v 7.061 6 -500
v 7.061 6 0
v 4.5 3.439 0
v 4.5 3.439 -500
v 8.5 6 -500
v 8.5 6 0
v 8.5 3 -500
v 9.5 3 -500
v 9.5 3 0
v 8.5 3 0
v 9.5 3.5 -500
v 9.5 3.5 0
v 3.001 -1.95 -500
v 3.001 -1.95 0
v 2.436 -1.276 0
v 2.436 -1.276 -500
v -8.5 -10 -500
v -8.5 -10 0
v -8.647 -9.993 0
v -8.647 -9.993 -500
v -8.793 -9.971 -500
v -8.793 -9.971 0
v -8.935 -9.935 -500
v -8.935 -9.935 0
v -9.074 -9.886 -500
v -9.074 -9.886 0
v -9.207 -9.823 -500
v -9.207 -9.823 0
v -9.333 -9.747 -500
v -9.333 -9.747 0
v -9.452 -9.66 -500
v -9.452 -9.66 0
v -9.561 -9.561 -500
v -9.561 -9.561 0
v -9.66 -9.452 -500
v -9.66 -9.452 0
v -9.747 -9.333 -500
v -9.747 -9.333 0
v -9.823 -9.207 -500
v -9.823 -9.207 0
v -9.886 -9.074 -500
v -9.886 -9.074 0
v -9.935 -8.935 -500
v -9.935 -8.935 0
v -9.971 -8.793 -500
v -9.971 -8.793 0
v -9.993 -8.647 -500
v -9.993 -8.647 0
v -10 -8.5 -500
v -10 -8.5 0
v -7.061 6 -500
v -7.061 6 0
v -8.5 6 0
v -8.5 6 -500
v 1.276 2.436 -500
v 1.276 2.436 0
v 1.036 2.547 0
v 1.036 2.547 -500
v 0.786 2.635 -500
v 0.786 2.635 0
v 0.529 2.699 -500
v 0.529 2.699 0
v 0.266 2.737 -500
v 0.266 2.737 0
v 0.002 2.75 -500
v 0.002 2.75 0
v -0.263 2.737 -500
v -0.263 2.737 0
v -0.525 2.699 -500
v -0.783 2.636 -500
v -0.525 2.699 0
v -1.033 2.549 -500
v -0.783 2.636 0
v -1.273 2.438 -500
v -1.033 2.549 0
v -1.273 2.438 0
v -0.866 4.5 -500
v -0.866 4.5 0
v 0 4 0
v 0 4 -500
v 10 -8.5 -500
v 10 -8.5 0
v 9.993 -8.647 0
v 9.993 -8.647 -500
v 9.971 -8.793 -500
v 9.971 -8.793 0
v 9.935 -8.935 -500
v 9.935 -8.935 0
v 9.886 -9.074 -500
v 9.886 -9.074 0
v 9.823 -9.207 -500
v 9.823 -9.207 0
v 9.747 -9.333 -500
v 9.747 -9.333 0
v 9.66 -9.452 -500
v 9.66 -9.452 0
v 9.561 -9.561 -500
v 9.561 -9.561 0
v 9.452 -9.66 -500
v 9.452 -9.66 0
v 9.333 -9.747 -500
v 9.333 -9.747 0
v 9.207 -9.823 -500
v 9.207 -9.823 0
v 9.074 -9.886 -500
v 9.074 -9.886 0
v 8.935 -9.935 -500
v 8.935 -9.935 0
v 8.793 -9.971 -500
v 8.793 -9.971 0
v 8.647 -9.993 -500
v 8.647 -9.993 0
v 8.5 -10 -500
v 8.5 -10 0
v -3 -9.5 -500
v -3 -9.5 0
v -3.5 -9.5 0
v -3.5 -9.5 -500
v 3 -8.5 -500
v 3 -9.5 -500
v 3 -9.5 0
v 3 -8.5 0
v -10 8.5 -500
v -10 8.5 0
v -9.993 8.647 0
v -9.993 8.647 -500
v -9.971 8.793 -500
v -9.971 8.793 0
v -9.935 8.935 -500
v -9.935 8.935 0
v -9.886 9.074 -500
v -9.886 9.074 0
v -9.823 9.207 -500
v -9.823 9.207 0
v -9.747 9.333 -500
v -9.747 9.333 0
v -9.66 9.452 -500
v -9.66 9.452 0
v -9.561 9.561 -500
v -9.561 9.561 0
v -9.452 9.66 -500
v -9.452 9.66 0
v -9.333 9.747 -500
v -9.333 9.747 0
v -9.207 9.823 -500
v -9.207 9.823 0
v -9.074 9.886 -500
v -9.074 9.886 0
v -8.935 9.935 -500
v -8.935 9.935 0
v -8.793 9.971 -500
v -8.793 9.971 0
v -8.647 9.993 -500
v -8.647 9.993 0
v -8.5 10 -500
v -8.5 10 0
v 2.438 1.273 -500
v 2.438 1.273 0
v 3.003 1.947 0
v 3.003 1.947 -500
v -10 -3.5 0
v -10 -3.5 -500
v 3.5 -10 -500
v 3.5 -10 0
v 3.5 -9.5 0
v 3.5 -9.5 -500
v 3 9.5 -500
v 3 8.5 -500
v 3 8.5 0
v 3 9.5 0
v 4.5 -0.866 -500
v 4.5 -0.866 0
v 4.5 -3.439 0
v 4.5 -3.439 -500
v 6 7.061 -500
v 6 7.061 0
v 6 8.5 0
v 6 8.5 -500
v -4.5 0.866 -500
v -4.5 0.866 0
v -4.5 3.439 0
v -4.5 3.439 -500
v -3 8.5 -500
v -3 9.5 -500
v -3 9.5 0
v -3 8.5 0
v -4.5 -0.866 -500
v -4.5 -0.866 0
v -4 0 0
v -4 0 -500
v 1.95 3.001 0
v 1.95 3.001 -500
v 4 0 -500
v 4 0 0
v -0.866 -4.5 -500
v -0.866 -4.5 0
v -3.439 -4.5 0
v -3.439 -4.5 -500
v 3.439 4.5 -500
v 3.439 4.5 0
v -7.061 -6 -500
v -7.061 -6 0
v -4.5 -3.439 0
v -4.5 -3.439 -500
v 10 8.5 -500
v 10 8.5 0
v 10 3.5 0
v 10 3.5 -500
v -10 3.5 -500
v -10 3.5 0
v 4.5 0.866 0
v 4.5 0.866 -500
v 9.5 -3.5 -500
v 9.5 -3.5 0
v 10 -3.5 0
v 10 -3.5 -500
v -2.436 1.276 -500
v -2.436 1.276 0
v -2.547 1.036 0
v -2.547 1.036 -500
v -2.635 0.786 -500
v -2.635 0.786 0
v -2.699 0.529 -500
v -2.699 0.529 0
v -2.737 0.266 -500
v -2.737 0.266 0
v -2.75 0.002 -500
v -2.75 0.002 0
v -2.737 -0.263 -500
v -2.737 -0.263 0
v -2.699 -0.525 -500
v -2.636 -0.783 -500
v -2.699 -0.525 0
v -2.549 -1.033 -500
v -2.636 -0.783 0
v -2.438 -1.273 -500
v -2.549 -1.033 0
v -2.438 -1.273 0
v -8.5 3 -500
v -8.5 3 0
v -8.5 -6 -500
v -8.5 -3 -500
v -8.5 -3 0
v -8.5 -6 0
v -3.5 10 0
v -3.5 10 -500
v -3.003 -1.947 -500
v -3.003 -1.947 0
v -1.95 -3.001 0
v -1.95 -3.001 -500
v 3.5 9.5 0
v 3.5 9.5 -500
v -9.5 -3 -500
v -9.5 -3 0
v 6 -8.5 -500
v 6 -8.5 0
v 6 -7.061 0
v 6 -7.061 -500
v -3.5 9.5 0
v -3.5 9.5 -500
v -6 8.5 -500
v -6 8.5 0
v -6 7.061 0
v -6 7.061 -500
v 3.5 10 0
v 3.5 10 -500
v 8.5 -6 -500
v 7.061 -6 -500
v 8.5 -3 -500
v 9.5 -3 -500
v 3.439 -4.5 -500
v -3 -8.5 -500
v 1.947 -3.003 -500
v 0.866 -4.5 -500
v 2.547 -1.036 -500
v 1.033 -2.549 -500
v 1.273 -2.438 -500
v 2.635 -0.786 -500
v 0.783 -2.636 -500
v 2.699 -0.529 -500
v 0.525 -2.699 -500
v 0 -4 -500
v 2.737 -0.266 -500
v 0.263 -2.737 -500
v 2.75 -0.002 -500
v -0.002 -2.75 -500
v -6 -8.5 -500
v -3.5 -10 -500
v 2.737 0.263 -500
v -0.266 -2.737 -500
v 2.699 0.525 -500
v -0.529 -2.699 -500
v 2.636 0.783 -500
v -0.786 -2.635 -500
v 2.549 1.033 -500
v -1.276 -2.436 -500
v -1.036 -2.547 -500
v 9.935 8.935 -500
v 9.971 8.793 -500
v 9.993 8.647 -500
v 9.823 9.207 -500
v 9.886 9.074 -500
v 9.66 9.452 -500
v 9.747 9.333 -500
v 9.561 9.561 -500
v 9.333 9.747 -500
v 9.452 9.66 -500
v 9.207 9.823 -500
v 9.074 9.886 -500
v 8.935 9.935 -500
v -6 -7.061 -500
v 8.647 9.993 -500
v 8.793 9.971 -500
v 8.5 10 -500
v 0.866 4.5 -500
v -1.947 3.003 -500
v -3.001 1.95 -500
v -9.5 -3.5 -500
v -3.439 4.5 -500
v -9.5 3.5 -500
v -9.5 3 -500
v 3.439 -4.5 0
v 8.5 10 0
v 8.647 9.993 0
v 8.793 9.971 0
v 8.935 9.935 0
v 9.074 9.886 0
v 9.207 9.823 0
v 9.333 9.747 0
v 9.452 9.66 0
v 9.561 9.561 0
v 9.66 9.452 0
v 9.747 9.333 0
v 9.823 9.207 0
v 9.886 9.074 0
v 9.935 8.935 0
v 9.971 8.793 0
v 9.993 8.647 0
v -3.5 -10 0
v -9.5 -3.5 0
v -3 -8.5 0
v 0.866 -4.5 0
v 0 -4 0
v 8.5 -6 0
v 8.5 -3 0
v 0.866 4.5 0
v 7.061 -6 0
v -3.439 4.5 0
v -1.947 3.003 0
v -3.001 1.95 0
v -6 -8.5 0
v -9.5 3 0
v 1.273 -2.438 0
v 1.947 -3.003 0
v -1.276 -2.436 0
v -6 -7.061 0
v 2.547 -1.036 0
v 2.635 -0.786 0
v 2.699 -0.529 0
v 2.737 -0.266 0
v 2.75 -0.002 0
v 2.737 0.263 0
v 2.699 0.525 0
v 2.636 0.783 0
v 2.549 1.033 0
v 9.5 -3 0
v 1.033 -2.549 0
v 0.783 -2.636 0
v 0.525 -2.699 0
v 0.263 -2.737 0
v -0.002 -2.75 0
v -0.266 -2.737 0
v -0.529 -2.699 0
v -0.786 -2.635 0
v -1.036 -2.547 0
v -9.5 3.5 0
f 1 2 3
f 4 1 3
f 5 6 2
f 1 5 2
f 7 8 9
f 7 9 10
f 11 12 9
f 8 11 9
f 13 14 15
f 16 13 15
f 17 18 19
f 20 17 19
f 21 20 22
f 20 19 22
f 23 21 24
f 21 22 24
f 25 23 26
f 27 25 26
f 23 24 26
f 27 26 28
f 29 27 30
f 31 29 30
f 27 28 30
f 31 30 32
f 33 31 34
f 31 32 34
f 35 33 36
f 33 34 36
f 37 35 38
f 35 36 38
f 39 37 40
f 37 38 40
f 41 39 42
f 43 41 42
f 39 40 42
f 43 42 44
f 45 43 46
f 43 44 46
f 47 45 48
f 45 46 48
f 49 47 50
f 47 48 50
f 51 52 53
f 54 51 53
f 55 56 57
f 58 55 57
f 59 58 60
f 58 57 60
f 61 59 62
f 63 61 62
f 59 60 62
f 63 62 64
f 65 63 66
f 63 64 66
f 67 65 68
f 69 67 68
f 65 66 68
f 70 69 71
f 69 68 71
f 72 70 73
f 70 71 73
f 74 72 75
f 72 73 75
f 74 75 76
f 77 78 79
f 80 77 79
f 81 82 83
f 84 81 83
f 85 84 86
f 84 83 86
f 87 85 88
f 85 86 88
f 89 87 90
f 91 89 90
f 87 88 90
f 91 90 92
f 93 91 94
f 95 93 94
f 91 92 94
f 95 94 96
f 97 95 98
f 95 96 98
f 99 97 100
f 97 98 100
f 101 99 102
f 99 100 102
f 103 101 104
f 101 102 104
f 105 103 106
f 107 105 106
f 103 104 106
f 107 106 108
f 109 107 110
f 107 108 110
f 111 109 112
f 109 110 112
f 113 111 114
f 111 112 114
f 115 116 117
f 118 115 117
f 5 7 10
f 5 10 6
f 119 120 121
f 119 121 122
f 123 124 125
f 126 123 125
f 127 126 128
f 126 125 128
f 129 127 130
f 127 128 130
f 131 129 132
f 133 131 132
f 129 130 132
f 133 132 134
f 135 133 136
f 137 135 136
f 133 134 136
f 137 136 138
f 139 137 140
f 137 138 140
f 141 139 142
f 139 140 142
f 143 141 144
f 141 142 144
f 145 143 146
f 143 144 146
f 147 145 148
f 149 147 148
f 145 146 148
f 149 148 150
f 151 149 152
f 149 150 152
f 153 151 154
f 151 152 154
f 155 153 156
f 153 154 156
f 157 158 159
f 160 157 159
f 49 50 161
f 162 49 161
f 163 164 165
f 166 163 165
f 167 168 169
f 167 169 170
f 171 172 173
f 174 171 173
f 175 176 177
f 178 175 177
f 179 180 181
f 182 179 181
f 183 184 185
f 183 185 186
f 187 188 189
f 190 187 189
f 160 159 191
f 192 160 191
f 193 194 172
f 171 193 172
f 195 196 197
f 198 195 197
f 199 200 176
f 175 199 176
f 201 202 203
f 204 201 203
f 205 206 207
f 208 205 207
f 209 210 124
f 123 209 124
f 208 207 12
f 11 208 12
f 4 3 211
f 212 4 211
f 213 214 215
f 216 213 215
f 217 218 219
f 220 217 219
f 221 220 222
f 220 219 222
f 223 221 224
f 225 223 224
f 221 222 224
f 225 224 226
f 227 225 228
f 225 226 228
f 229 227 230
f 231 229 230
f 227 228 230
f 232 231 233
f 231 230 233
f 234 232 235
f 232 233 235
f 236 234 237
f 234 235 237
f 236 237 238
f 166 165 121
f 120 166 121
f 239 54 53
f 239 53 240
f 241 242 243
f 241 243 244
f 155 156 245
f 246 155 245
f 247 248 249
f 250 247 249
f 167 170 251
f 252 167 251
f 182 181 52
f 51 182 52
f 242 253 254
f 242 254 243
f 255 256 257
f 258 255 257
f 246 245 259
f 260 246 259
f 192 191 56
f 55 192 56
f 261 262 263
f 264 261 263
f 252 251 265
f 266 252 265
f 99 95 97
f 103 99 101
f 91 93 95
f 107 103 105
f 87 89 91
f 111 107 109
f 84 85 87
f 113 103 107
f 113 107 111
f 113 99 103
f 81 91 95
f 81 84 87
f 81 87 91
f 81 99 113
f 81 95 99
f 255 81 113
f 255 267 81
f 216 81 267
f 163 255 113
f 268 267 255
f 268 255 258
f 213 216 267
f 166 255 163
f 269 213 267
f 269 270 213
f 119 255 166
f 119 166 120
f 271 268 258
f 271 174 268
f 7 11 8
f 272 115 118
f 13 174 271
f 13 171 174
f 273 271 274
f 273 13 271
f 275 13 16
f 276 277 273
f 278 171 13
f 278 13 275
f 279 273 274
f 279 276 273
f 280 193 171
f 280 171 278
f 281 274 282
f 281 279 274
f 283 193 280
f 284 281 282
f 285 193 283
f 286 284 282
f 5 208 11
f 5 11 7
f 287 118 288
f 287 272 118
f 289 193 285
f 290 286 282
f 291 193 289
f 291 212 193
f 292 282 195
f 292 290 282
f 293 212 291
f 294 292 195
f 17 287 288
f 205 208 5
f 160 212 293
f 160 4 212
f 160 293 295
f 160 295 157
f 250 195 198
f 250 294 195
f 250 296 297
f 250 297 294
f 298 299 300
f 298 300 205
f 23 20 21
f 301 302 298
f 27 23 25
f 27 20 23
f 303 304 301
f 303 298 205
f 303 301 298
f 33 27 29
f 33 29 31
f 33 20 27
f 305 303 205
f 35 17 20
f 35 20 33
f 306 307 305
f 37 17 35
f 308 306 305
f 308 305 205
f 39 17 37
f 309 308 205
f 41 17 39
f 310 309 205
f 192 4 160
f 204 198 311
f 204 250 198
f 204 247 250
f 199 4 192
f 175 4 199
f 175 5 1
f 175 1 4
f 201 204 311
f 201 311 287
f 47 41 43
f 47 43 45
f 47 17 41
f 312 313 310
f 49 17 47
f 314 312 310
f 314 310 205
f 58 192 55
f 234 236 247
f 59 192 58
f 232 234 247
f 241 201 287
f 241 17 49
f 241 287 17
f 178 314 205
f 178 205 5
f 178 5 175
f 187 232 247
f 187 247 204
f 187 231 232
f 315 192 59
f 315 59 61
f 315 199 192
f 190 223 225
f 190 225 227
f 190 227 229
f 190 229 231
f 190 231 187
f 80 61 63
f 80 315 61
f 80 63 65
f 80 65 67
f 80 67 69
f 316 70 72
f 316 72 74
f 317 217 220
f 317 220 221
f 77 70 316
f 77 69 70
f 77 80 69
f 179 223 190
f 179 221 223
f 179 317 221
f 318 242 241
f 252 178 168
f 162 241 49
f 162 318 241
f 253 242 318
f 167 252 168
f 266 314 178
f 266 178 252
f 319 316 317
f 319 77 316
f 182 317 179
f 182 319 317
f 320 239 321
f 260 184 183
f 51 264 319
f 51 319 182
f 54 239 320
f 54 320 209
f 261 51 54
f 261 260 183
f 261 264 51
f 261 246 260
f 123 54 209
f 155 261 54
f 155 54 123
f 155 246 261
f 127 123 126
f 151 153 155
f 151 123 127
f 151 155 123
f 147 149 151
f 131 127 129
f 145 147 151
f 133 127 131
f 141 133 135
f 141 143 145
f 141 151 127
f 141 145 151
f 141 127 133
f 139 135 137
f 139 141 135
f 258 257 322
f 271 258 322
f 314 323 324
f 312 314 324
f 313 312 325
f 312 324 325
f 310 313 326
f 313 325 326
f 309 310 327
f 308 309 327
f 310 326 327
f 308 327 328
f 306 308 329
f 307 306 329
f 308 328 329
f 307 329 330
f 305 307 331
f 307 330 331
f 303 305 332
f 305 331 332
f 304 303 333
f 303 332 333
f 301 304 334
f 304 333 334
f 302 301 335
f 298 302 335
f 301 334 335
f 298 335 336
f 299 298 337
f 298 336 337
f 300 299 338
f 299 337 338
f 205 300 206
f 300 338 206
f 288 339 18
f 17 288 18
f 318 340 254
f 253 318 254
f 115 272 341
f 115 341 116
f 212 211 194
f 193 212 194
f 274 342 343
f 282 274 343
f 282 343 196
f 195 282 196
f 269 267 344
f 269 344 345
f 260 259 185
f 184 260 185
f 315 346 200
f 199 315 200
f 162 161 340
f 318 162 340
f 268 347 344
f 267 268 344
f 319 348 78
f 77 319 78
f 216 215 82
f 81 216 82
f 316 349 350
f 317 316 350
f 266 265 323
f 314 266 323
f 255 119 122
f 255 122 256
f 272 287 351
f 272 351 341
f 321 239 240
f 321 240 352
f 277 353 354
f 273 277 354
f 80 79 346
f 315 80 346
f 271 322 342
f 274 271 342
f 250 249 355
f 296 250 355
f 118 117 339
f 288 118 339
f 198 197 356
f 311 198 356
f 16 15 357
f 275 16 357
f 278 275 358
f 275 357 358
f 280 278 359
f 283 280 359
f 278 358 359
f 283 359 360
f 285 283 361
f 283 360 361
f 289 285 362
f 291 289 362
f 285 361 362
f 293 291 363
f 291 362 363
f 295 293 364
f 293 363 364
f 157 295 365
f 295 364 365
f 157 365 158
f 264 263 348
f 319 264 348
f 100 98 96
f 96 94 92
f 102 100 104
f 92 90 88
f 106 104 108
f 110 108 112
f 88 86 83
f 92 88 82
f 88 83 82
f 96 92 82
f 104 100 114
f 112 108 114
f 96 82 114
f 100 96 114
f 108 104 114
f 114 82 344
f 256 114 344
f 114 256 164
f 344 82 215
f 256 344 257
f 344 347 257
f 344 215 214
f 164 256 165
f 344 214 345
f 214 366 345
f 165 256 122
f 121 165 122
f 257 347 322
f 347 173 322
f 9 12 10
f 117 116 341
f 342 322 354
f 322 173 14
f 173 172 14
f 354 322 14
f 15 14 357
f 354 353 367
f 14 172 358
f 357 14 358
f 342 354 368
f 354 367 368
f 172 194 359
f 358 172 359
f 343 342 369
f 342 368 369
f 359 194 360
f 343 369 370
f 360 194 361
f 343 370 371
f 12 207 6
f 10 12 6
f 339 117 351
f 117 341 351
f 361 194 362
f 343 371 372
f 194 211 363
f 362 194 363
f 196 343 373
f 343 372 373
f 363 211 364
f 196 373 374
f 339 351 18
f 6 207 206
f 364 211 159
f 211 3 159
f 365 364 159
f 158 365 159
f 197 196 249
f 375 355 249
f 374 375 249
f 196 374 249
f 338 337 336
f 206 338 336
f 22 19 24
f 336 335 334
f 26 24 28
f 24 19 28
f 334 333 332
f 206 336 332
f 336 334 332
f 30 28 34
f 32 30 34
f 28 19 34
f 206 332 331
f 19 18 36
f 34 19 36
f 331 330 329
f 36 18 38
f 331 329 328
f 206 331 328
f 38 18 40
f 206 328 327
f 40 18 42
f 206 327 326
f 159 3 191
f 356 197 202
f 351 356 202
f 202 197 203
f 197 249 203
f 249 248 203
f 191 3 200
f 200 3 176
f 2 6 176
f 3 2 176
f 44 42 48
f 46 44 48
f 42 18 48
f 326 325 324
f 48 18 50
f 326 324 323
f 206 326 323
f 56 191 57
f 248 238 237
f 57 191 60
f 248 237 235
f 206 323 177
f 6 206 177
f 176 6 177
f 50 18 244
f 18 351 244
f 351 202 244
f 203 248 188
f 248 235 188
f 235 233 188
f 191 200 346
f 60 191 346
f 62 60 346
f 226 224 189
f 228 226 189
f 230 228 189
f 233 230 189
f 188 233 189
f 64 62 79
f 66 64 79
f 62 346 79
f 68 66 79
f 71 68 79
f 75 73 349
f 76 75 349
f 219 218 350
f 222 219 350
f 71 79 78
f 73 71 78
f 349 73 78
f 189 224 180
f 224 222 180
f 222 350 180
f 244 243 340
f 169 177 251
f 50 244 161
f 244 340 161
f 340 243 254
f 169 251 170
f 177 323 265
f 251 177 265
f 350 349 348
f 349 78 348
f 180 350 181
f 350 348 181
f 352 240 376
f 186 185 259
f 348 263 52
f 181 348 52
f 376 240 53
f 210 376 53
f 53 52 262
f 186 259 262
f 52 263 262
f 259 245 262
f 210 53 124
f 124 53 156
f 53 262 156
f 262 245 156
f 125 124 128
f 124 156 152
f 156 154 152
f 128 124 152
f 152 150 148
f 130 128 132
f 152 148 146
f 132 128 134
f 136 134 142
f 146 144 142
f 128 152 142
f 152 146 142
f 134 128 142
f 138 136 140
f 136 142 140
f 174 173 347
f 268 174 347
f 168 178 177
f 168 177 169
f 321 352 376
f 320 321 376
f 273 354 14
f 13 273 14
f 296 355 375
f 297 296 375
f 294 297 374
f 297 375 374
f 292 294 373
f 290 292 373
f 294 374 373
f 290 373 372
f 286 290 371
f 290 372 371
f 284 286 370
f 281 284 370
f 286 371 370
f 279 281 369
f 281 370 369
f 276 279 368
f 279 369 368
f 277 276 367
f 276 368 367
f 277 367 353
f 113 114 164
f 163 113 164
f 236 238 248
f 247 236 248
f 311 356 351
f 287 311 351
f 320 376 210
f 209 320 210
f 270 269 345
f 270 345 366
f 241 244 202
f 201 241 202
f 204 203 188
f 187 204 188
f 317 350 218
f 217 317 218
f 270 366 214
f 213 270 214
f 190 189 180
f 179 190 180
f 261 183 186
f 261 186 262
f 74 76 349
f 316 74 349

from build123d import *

# Parameters (mm, degrees)
BOSS_EXTRU_1_DEPTH      = 500
ENL_V_MAT_EXTRU_1_DEPTH = 501.199960016


with BuildPart() as part:
    # Esquisse1 → Boss.-Extru.1 (new body)
    with BuildSketch(Plane.XY):
        with BuildLine():
            Line((-4, 0), (-4.5, 0.866025404))
            Line((-4.5, 0.866025404), (-4.5, 3.439339828))
            Line((-4.5, 3.439339828), (-7.060660172, 6))
            Line((-7.060660172, 6), (-8.5, 6))
            Line((-8.5, 6), (-8.5, 3))
            Line((-8.5, 3), (-9.5, 3))
            Line((-9.5, 3), (-9.5, 3.5))
            Line((-9.5, 3.5), (-10, 3.5))
            Line((-10, 3.5), (-10, 8.5))
            ThreePointArc((-10, 8.5), (-9.560660172, 9.560660172), (-8.5, 10))
            Line((-8.5, 10), (-3.5, 10))
            Line((-3.5, 10), (-3.5, 9.5))
            Line((-3.5, 9.5), (-3, 9.5))
            Line((-3, 9.5), (-3, 8.5))
            Line((-3, 8.5), (-6, 8.5))
            Line((-6, 8.5), (-6, 7.060660172))
            Line((-6, 7.060660172), (-3.439339828, 4.5))
            Line((-3.439339828, 4.5), (-0.866025404, 4.5))
            Line((-0.866025404, 4.5), (0, 4))
            Line((0, 4), (0.866025404, 4.5))
            Line((0.866025404, 4.5), (3.439339828, 4.5))
            Line((3.439339828, 4.5), (6, 7.060660172))
            Line((6, 7.060660172), (6, 8.5))
            Line((6, 8.5), (3, 8.5))
            Line((3, 8.5), (3, 9.5))
            Line((3, 9.5), (3.5, 9.5))
            Line((3.5, 9.5), (3.5, 10))
            Line((3.5, 10), (8.5, 10))
            ThreePointArc((8.5, 10), (9.560660172, 9.560660172), (10, 8.5))
            Line((10, 8.5), (10, 3.5))
            Line((10, 3.5), (9.5, 3.5))
            Line((9.5, 3.5), (9.5, 3))
            Line((9.5, 3), (8.5, 3))
            Line((8.5, 3), (8.5, 6))
            Line((8.5, 6), (7.060660172, 6))
            Line((7.060660172, 6), (4.5, 3.439339828))
            Line((4.5, 3.439339828), (4.5, 0.866025404))
            Line((4.5, 0.866025404), (4, 0))
            Line((4, 0), (4.5, -0.866025404))
            Line((4.5, -0.866025404), (4.5, -3.439339828))
            Line((4.5, -3.439339828), (7.060660172, -6))
            Line((7.060660172, -6), (8.5, -6))
            Line((8.5, -6), (8.5, -3))
            Line((8.5, -3), (9.5, -3))
            Line((9.5, -3), (9.5, -3.5))
            Line((9.5, -3.5), (10, -3.5))
            Line((10, -3.5), (10, -8.5))
            ThreePointArc((10, -8.5), (9.560660172, -9.560660172), (8.5, -10))
            Line((8.5, -10), (3.5, -10))
            Line((3.5, -10), (3.5, -9.5))
            Line((3.5, -9.5), (3, -9.5))
            Line((3, -9.5), (3, -8.5))
            Line((3, -8.5), (6, -8.5))
            Line((6, -8.5), (6, -7.060660172))
            Line((6, -7.060660172), (3.439339828, -4.5))
            Line((3.439339828, -4.5), (0.866025404, -4.5))
            Line((0.866025404, -4.5), (0, -4))
            Line((0, -4), (-0.866025404, -4.5))
            Line((-0.866025404, -4.5), (-3.439339828, -4.5))
            Line((-3.439339828, -4.5), (-6, -7.060660172))
            Line((-6, -7.060660172), (-6, -8.5))
            Line((-6, -8.5), (-3, -8.5))
            Line((-3, -8.5), (-3, -9.5))
            Line((-3, -9.5), (-3.5, -9.5))
            Line((-3.5, -9.5), (-3.5, -10))
            Line((-3.5, -10), (-8.5, -10))
            ThreePointArc((-8.5, -10), (-9.560660172, -9.560660172), (-10, -8.5))
            Line((-10, -8.5), (-10, -3.5))
            Line((-10, -3.5), (-9.5, -3.5))
            Line((-9.5, -3.5), (-9.5, -3))
            Line((-9.5, -3), (-8.5, -3))
            Line((-8.5, -3), (-8.5, -6))
            Line((-8.5, -6), (-7.060660172, -6))
            Line((-7.060660172, -6), (-4.5, -3.439339828))
            Line((-4.5, -3.439339828), (-4.5, -0.866025404))
            Line((-4.5, -0.866025404), (-4, 0))
        make_face()
    extrude(amount=-BOSS_EXTRU_1_DEPTH)

    # Esquisse2 → Enlèv. mat.-Extru.1 (cut, through all)
    with BuildSketch(Plane.XY):
        with BuildLine():
            Line((1.949592103, 3.000876196), (1.276279893, 2.435900169))
            ThreePointArc((1.276279893, 2.435900169), (0.001756003, 2.749999439), (-1.273167982, 2.43752811))
            Line((-1.273167982, 2.43752811), (-1.947287092, 3.003181207))
            Line((-1.947287092, 3.003181207), (-3.000876196, 1.949592103))
            Line((-3.000876196, 1.949592103), (-2.435900169, 1.276279893))
            ThreePointArc((-2.435900169, 1.276279893), (-2.749999439, 0.001756003), (-2.43752811, -1.273167982))
            Line((-2.43752811, -1.273167982), (-3.003181207, -1.947287092))
            Line((-3.003181207, -1.947287092), (-1.949592103, -3.000876196))
            Line((-1.949592103, -3.000876196), (-1.276279893, -2.435900169))
            ThreePointArc((-1.276279893, -2.435900169), (-0.001756003, -2.749999439), (1.273167982, -2.43752811))
            Line((1.273167982, -2.43752811), (1.947287092, -3.003181207))
            Line((1.947287092, -3.003181207), (3.000876196, -1.949592103))
            Line((3.000876196, -1.949592103), (2.435900169, -1.276279893))
            ThreePointArc((2.435900169, -1.276279893), (2.749999439, -0.001756003), (2.43752811, 1.273167982))
            Line((2.43752811, 1.273167982), (3.003181207, 1.947287092))
            Line((3.003181207, 1.947287092), (1.949592103, 3.000876196))
        make_face()
    extrude(amount=-ENL_V_MAT_EXTRU_1_DEPTH, mode=Mode.SUBTRACT)


solid = part.part
